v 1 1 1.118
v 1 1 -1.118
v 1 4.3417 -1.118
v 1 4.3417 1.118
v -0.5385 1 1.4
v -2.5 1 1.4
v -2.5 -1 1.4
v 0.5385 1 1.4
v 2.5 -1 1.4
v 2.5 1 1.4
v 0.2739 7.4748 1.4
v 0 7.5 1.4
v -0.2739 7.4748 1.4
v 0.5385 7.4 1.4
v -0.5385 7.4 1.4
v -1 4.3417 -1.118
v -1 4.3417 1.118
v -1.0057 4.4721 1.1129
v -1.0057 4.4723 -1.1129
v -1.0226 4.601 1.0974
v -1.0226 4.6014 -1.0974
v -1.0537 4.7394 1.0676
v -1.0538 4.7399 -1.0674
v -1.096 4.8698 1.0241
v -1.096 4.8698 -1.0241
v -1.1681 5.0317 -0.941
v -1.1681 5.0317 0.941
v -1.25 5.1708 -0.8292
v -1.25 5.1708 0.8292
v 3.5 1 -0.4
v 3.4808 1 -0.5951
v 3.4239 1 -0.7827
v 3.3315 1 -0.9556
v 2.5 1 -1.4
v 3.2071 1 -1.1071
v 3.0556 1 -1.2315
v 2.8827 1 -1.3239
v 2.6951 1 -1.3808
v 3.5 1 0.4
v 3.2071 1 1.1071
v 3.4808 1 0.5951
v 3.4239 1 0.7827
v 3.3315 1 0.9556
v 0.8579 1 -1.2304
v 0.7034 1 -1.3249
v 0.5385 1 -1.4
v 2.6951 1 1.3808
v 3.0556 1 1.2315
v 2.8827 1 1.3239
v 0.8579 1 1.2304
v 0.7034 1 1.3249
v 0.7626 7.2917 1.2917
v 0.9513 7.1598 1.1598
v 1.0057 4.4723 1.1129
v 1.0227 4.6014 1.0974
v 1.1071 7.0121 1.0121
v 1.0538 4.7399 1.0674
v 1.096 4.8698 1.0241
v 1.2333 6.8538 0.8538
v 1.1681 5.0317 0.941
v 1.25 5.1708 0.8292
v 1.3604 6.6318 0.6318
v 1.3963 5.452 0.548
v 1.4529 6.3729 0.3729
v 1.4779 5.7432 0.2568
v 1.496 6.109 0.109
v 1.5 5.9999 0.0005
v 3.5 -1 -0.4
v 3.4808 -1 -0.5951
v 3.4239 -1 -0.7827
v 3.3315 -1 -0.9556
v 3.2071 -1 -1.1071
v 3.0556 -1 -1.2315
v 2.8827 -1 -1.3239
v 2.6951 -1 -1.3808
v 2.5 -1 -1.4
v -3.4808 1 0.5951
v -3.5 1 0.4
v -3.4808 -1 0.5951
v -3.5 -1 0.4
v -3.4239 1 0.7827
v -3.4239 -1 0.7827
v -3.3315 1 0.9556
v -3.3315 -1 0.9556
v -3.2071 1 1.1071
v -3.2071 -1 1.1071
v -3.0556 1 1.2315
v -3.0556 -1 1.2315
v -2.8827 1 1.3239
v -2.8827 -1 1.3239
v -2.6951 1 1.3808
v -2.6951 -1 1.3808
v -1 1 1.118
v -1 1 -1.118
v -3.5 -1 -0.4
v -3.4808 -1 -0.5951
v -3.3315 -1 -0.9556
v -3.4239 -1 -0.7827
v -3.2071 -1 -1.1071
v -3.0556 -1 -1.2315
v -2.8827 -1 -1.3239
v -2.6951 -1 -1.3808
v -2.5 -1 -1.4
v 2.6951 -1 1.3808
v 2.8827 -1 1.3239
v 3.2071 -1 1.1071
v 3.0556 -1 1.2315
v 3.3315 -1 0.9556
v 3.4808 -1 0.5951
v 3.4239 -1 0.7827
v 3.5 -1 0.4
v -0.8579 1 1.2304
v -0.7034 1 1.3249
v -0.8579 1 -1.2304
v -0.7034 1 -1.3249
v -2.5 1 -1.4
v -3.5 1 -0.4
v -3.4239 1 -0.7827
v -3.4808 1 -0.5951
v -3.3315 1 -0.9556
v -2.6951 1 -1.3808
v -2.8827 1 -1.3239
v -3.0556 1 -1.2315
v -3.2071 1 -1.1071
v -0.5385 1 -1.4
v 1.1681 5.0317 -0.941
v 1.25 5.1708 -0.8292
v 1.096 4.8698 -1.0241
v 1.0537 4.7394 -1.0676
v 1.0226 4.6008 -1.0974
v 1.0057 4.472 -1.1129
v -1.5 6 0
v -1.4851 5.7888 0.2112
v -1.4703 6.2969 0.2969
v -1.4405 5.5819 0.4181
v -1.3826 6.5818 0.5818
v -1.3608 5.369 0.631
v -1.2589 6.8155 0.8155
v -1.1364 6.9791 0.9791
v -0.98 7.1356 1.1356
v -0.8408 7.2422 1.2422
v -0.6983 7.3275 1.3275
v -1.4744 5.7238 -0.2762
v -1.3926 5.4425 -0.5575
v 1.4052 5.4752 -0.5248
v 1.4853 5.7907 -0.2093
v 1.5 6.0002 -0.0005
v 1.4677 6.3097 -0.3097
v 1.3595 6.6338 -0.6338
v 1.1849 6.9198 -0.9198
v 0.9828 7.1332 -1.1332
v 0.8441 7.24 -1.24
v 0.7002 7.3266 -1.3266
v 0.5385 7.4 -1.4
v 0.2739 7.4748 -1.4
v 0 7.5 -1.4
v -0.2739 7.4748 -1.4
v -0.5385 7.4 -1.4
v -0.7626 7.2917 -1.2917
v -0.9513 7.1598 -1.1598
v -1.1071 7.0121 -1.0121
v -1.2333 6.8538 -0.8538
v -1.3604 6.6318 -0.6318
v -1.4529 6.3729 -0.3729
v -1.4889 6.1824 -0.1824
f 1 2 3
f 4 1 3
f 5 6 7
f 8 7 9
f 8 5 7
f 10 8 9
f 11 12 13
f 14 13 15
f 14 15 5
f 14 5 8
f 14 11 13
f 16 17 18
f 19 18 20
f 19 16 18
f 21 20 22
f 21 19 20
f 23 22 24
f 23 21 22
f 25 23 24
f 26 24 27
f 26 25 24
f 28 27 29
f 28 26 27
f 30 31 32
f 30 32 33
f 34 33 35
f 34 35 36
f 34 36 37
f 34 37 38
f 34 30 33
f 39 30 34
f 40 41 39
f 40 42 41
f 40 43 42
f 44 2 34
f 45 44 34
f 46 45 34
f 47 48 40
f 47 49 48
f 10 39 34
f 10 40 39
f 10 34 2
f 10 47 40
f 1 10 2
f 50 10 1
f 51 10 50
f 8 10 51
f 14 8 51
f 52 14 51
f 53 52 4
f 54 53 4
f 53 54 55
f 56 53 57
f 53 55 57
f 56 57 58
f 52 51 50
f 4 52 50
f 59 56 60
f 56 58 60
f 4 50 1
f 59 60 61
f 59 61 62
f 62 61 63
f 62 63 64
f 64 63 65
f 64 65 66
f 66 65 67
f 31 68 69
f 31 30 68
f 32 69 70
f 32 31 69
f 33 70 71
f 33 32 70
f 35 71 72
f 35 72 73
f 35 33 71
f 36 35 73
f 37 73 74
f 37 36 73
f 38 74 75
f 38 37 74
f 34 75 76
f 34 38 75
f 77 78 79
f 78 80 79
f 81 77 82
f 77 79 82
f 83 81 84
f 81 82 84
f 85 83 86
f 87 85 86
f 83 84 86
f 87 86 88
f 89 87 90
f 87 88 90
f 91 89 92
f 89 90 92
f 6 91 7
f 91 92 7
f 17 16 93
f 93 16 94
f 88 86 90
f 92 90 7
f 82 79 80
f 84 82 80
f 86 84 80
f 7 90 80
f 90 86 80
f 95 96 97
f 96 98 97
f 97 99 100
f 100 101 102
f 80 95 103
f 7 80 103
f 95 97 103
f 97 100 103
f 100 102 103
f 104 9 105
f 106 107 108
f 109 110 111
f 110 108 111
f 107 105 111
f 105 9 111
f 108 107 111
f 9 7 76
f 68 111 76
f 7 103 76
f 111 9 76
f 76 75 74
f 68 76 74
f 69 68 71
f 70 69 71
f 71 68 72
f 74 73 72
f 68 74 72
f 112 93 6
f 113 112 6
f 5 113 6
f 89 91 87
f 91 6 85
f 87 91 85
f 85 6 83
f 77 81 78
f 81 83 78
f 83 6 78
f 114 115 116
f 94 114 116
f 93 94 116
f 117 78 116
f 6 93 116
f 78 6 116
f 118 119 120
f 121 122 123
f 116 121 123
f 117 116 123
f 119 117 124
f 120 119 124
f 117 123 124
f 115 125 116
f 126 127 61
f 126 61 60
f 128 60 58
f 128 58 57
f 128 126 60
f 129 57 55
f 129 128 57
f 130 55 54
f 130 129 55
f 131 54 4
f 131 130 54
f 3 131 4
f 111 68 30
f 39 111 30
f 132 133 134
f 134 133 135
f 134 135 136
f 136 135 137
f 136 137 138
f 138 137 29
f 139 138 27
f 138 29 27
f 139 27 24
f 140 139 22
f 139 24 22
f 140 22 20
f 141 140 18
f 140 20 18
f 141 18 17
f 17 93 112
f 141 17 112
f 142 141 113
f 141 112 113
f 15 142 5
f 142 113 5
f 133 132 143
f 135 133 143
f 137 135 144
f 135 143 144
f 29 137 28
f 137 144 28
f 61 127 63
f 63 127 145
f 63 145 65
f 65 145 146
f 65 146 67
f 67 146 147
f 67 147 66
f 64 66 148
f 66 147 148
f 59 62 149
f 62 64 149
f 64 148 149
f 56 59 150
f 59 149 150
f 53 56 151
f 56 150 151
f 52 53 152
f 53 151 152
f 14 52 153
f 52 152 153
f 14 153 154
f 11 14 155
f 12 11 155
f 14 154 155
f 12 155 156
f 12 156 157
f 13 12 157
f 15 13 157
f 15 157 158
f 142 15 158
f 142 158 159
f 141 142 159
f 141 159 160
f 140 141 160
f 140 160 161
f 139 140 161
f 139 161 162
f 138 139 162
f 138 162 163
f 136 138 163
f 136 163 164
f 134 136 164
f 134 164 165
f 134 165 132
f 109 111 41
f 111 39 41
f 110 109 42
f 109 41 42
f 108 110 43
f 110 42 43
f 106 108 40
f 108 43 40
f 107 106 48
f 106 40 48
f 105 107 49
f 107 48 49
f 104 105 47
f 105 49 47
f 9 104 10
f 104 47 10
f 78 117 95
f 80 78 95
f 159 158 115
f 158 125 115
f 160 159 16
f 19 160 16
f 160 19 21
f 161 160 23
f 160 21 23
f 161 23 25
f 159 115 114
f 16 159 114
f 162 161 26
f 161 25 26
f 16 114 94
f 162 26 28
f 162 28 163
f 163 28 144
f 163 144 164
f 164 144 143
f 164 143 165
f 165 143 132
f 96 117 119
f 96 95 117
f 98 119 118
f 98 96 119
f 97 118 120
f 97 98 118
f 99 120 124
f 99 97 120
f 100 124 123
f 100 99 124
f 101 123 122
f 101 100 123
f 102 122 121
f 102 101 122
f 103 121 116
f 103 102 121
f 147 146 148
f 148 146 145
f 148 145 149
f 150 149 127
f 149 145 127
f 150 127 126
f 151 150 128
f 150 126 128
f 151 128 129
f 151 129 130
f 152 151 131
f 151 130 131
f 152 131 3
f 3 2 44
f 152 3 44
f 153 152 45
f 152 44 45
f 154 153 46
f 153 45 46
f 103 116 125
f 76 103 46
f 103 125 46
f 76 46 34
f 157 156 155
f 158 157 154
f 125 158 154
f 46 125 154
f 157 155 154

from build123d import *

# Parameters (mm, degrees)
PAD061_DEPTH      = 1.4
PAD061_DEPTH_BACK = 1.4
SKETCH083_R       = 2.5
SKETCH083_R_2     = 1.5
POCKET035_DEPTH   = 7
FILLET036_R       = 1


with BuildPart() as part:
    # Sketch082 → Pad061 (new body, two sides)
    with BuildSketch(Plane.XY) as pad061_sk:
        with BuildLine():
            ThreePointArc((1.25, 5.170844), (0, 7.5), (-1.25, 5.170844))
            ThreePointArc((-1, 4.341688), (-1.063859, 4.7747), (-1.25, 5.170844))
            Line((-1, 4.341688), (-1, 1))
            Line((-1, 1), (-3.5, 1))
            Line((-3.5, 1), (-3.5, -1))
            Line((-3.5, -1), (3.5, -1))
            Line((3.5, -1), (3.5, 1))
            Line((3.5, 1), (1, 1))
            Line((1, 1), (1, 4.341688))
            ThreePointArc((1.25, 5.170844), (1.063859, 4.7747), (1, 4.341688))
        make_face()
    extrude(amount=-PAD061_DEPTH)
    extrude(pad061_sk.sketch, amount=PAD061_DEPTH_BACK)

    # Sketch083 (on Face4 of Pad061) → Pocket035 (cut)
    with BuildSketch(Plane(origin=(0, 1, 0), x_dir=(-1, 0, 0), z_dir=(0, 1, 0))):
        Circle(SKETCH083_R)
        Circle(SKETCH083_R_2, mode=Mode.SUBTRACT)
    extrude(amount=POCKET035_DEPTH, mode=Mode.SUBTRACT)

    # Fillet036
    fillet036_edges = [part.edges().sort_by_distance(p)[0] for p in [
        (-3.5, 0, -1.4),
        (-3.5, 0, 1.4),
        (3.5, 0, 1.4),
        (3.5, 0, -1.4),
    ]]
    fillet(fillet036_edges, radius=FILLET036_R)


solid = part.part
